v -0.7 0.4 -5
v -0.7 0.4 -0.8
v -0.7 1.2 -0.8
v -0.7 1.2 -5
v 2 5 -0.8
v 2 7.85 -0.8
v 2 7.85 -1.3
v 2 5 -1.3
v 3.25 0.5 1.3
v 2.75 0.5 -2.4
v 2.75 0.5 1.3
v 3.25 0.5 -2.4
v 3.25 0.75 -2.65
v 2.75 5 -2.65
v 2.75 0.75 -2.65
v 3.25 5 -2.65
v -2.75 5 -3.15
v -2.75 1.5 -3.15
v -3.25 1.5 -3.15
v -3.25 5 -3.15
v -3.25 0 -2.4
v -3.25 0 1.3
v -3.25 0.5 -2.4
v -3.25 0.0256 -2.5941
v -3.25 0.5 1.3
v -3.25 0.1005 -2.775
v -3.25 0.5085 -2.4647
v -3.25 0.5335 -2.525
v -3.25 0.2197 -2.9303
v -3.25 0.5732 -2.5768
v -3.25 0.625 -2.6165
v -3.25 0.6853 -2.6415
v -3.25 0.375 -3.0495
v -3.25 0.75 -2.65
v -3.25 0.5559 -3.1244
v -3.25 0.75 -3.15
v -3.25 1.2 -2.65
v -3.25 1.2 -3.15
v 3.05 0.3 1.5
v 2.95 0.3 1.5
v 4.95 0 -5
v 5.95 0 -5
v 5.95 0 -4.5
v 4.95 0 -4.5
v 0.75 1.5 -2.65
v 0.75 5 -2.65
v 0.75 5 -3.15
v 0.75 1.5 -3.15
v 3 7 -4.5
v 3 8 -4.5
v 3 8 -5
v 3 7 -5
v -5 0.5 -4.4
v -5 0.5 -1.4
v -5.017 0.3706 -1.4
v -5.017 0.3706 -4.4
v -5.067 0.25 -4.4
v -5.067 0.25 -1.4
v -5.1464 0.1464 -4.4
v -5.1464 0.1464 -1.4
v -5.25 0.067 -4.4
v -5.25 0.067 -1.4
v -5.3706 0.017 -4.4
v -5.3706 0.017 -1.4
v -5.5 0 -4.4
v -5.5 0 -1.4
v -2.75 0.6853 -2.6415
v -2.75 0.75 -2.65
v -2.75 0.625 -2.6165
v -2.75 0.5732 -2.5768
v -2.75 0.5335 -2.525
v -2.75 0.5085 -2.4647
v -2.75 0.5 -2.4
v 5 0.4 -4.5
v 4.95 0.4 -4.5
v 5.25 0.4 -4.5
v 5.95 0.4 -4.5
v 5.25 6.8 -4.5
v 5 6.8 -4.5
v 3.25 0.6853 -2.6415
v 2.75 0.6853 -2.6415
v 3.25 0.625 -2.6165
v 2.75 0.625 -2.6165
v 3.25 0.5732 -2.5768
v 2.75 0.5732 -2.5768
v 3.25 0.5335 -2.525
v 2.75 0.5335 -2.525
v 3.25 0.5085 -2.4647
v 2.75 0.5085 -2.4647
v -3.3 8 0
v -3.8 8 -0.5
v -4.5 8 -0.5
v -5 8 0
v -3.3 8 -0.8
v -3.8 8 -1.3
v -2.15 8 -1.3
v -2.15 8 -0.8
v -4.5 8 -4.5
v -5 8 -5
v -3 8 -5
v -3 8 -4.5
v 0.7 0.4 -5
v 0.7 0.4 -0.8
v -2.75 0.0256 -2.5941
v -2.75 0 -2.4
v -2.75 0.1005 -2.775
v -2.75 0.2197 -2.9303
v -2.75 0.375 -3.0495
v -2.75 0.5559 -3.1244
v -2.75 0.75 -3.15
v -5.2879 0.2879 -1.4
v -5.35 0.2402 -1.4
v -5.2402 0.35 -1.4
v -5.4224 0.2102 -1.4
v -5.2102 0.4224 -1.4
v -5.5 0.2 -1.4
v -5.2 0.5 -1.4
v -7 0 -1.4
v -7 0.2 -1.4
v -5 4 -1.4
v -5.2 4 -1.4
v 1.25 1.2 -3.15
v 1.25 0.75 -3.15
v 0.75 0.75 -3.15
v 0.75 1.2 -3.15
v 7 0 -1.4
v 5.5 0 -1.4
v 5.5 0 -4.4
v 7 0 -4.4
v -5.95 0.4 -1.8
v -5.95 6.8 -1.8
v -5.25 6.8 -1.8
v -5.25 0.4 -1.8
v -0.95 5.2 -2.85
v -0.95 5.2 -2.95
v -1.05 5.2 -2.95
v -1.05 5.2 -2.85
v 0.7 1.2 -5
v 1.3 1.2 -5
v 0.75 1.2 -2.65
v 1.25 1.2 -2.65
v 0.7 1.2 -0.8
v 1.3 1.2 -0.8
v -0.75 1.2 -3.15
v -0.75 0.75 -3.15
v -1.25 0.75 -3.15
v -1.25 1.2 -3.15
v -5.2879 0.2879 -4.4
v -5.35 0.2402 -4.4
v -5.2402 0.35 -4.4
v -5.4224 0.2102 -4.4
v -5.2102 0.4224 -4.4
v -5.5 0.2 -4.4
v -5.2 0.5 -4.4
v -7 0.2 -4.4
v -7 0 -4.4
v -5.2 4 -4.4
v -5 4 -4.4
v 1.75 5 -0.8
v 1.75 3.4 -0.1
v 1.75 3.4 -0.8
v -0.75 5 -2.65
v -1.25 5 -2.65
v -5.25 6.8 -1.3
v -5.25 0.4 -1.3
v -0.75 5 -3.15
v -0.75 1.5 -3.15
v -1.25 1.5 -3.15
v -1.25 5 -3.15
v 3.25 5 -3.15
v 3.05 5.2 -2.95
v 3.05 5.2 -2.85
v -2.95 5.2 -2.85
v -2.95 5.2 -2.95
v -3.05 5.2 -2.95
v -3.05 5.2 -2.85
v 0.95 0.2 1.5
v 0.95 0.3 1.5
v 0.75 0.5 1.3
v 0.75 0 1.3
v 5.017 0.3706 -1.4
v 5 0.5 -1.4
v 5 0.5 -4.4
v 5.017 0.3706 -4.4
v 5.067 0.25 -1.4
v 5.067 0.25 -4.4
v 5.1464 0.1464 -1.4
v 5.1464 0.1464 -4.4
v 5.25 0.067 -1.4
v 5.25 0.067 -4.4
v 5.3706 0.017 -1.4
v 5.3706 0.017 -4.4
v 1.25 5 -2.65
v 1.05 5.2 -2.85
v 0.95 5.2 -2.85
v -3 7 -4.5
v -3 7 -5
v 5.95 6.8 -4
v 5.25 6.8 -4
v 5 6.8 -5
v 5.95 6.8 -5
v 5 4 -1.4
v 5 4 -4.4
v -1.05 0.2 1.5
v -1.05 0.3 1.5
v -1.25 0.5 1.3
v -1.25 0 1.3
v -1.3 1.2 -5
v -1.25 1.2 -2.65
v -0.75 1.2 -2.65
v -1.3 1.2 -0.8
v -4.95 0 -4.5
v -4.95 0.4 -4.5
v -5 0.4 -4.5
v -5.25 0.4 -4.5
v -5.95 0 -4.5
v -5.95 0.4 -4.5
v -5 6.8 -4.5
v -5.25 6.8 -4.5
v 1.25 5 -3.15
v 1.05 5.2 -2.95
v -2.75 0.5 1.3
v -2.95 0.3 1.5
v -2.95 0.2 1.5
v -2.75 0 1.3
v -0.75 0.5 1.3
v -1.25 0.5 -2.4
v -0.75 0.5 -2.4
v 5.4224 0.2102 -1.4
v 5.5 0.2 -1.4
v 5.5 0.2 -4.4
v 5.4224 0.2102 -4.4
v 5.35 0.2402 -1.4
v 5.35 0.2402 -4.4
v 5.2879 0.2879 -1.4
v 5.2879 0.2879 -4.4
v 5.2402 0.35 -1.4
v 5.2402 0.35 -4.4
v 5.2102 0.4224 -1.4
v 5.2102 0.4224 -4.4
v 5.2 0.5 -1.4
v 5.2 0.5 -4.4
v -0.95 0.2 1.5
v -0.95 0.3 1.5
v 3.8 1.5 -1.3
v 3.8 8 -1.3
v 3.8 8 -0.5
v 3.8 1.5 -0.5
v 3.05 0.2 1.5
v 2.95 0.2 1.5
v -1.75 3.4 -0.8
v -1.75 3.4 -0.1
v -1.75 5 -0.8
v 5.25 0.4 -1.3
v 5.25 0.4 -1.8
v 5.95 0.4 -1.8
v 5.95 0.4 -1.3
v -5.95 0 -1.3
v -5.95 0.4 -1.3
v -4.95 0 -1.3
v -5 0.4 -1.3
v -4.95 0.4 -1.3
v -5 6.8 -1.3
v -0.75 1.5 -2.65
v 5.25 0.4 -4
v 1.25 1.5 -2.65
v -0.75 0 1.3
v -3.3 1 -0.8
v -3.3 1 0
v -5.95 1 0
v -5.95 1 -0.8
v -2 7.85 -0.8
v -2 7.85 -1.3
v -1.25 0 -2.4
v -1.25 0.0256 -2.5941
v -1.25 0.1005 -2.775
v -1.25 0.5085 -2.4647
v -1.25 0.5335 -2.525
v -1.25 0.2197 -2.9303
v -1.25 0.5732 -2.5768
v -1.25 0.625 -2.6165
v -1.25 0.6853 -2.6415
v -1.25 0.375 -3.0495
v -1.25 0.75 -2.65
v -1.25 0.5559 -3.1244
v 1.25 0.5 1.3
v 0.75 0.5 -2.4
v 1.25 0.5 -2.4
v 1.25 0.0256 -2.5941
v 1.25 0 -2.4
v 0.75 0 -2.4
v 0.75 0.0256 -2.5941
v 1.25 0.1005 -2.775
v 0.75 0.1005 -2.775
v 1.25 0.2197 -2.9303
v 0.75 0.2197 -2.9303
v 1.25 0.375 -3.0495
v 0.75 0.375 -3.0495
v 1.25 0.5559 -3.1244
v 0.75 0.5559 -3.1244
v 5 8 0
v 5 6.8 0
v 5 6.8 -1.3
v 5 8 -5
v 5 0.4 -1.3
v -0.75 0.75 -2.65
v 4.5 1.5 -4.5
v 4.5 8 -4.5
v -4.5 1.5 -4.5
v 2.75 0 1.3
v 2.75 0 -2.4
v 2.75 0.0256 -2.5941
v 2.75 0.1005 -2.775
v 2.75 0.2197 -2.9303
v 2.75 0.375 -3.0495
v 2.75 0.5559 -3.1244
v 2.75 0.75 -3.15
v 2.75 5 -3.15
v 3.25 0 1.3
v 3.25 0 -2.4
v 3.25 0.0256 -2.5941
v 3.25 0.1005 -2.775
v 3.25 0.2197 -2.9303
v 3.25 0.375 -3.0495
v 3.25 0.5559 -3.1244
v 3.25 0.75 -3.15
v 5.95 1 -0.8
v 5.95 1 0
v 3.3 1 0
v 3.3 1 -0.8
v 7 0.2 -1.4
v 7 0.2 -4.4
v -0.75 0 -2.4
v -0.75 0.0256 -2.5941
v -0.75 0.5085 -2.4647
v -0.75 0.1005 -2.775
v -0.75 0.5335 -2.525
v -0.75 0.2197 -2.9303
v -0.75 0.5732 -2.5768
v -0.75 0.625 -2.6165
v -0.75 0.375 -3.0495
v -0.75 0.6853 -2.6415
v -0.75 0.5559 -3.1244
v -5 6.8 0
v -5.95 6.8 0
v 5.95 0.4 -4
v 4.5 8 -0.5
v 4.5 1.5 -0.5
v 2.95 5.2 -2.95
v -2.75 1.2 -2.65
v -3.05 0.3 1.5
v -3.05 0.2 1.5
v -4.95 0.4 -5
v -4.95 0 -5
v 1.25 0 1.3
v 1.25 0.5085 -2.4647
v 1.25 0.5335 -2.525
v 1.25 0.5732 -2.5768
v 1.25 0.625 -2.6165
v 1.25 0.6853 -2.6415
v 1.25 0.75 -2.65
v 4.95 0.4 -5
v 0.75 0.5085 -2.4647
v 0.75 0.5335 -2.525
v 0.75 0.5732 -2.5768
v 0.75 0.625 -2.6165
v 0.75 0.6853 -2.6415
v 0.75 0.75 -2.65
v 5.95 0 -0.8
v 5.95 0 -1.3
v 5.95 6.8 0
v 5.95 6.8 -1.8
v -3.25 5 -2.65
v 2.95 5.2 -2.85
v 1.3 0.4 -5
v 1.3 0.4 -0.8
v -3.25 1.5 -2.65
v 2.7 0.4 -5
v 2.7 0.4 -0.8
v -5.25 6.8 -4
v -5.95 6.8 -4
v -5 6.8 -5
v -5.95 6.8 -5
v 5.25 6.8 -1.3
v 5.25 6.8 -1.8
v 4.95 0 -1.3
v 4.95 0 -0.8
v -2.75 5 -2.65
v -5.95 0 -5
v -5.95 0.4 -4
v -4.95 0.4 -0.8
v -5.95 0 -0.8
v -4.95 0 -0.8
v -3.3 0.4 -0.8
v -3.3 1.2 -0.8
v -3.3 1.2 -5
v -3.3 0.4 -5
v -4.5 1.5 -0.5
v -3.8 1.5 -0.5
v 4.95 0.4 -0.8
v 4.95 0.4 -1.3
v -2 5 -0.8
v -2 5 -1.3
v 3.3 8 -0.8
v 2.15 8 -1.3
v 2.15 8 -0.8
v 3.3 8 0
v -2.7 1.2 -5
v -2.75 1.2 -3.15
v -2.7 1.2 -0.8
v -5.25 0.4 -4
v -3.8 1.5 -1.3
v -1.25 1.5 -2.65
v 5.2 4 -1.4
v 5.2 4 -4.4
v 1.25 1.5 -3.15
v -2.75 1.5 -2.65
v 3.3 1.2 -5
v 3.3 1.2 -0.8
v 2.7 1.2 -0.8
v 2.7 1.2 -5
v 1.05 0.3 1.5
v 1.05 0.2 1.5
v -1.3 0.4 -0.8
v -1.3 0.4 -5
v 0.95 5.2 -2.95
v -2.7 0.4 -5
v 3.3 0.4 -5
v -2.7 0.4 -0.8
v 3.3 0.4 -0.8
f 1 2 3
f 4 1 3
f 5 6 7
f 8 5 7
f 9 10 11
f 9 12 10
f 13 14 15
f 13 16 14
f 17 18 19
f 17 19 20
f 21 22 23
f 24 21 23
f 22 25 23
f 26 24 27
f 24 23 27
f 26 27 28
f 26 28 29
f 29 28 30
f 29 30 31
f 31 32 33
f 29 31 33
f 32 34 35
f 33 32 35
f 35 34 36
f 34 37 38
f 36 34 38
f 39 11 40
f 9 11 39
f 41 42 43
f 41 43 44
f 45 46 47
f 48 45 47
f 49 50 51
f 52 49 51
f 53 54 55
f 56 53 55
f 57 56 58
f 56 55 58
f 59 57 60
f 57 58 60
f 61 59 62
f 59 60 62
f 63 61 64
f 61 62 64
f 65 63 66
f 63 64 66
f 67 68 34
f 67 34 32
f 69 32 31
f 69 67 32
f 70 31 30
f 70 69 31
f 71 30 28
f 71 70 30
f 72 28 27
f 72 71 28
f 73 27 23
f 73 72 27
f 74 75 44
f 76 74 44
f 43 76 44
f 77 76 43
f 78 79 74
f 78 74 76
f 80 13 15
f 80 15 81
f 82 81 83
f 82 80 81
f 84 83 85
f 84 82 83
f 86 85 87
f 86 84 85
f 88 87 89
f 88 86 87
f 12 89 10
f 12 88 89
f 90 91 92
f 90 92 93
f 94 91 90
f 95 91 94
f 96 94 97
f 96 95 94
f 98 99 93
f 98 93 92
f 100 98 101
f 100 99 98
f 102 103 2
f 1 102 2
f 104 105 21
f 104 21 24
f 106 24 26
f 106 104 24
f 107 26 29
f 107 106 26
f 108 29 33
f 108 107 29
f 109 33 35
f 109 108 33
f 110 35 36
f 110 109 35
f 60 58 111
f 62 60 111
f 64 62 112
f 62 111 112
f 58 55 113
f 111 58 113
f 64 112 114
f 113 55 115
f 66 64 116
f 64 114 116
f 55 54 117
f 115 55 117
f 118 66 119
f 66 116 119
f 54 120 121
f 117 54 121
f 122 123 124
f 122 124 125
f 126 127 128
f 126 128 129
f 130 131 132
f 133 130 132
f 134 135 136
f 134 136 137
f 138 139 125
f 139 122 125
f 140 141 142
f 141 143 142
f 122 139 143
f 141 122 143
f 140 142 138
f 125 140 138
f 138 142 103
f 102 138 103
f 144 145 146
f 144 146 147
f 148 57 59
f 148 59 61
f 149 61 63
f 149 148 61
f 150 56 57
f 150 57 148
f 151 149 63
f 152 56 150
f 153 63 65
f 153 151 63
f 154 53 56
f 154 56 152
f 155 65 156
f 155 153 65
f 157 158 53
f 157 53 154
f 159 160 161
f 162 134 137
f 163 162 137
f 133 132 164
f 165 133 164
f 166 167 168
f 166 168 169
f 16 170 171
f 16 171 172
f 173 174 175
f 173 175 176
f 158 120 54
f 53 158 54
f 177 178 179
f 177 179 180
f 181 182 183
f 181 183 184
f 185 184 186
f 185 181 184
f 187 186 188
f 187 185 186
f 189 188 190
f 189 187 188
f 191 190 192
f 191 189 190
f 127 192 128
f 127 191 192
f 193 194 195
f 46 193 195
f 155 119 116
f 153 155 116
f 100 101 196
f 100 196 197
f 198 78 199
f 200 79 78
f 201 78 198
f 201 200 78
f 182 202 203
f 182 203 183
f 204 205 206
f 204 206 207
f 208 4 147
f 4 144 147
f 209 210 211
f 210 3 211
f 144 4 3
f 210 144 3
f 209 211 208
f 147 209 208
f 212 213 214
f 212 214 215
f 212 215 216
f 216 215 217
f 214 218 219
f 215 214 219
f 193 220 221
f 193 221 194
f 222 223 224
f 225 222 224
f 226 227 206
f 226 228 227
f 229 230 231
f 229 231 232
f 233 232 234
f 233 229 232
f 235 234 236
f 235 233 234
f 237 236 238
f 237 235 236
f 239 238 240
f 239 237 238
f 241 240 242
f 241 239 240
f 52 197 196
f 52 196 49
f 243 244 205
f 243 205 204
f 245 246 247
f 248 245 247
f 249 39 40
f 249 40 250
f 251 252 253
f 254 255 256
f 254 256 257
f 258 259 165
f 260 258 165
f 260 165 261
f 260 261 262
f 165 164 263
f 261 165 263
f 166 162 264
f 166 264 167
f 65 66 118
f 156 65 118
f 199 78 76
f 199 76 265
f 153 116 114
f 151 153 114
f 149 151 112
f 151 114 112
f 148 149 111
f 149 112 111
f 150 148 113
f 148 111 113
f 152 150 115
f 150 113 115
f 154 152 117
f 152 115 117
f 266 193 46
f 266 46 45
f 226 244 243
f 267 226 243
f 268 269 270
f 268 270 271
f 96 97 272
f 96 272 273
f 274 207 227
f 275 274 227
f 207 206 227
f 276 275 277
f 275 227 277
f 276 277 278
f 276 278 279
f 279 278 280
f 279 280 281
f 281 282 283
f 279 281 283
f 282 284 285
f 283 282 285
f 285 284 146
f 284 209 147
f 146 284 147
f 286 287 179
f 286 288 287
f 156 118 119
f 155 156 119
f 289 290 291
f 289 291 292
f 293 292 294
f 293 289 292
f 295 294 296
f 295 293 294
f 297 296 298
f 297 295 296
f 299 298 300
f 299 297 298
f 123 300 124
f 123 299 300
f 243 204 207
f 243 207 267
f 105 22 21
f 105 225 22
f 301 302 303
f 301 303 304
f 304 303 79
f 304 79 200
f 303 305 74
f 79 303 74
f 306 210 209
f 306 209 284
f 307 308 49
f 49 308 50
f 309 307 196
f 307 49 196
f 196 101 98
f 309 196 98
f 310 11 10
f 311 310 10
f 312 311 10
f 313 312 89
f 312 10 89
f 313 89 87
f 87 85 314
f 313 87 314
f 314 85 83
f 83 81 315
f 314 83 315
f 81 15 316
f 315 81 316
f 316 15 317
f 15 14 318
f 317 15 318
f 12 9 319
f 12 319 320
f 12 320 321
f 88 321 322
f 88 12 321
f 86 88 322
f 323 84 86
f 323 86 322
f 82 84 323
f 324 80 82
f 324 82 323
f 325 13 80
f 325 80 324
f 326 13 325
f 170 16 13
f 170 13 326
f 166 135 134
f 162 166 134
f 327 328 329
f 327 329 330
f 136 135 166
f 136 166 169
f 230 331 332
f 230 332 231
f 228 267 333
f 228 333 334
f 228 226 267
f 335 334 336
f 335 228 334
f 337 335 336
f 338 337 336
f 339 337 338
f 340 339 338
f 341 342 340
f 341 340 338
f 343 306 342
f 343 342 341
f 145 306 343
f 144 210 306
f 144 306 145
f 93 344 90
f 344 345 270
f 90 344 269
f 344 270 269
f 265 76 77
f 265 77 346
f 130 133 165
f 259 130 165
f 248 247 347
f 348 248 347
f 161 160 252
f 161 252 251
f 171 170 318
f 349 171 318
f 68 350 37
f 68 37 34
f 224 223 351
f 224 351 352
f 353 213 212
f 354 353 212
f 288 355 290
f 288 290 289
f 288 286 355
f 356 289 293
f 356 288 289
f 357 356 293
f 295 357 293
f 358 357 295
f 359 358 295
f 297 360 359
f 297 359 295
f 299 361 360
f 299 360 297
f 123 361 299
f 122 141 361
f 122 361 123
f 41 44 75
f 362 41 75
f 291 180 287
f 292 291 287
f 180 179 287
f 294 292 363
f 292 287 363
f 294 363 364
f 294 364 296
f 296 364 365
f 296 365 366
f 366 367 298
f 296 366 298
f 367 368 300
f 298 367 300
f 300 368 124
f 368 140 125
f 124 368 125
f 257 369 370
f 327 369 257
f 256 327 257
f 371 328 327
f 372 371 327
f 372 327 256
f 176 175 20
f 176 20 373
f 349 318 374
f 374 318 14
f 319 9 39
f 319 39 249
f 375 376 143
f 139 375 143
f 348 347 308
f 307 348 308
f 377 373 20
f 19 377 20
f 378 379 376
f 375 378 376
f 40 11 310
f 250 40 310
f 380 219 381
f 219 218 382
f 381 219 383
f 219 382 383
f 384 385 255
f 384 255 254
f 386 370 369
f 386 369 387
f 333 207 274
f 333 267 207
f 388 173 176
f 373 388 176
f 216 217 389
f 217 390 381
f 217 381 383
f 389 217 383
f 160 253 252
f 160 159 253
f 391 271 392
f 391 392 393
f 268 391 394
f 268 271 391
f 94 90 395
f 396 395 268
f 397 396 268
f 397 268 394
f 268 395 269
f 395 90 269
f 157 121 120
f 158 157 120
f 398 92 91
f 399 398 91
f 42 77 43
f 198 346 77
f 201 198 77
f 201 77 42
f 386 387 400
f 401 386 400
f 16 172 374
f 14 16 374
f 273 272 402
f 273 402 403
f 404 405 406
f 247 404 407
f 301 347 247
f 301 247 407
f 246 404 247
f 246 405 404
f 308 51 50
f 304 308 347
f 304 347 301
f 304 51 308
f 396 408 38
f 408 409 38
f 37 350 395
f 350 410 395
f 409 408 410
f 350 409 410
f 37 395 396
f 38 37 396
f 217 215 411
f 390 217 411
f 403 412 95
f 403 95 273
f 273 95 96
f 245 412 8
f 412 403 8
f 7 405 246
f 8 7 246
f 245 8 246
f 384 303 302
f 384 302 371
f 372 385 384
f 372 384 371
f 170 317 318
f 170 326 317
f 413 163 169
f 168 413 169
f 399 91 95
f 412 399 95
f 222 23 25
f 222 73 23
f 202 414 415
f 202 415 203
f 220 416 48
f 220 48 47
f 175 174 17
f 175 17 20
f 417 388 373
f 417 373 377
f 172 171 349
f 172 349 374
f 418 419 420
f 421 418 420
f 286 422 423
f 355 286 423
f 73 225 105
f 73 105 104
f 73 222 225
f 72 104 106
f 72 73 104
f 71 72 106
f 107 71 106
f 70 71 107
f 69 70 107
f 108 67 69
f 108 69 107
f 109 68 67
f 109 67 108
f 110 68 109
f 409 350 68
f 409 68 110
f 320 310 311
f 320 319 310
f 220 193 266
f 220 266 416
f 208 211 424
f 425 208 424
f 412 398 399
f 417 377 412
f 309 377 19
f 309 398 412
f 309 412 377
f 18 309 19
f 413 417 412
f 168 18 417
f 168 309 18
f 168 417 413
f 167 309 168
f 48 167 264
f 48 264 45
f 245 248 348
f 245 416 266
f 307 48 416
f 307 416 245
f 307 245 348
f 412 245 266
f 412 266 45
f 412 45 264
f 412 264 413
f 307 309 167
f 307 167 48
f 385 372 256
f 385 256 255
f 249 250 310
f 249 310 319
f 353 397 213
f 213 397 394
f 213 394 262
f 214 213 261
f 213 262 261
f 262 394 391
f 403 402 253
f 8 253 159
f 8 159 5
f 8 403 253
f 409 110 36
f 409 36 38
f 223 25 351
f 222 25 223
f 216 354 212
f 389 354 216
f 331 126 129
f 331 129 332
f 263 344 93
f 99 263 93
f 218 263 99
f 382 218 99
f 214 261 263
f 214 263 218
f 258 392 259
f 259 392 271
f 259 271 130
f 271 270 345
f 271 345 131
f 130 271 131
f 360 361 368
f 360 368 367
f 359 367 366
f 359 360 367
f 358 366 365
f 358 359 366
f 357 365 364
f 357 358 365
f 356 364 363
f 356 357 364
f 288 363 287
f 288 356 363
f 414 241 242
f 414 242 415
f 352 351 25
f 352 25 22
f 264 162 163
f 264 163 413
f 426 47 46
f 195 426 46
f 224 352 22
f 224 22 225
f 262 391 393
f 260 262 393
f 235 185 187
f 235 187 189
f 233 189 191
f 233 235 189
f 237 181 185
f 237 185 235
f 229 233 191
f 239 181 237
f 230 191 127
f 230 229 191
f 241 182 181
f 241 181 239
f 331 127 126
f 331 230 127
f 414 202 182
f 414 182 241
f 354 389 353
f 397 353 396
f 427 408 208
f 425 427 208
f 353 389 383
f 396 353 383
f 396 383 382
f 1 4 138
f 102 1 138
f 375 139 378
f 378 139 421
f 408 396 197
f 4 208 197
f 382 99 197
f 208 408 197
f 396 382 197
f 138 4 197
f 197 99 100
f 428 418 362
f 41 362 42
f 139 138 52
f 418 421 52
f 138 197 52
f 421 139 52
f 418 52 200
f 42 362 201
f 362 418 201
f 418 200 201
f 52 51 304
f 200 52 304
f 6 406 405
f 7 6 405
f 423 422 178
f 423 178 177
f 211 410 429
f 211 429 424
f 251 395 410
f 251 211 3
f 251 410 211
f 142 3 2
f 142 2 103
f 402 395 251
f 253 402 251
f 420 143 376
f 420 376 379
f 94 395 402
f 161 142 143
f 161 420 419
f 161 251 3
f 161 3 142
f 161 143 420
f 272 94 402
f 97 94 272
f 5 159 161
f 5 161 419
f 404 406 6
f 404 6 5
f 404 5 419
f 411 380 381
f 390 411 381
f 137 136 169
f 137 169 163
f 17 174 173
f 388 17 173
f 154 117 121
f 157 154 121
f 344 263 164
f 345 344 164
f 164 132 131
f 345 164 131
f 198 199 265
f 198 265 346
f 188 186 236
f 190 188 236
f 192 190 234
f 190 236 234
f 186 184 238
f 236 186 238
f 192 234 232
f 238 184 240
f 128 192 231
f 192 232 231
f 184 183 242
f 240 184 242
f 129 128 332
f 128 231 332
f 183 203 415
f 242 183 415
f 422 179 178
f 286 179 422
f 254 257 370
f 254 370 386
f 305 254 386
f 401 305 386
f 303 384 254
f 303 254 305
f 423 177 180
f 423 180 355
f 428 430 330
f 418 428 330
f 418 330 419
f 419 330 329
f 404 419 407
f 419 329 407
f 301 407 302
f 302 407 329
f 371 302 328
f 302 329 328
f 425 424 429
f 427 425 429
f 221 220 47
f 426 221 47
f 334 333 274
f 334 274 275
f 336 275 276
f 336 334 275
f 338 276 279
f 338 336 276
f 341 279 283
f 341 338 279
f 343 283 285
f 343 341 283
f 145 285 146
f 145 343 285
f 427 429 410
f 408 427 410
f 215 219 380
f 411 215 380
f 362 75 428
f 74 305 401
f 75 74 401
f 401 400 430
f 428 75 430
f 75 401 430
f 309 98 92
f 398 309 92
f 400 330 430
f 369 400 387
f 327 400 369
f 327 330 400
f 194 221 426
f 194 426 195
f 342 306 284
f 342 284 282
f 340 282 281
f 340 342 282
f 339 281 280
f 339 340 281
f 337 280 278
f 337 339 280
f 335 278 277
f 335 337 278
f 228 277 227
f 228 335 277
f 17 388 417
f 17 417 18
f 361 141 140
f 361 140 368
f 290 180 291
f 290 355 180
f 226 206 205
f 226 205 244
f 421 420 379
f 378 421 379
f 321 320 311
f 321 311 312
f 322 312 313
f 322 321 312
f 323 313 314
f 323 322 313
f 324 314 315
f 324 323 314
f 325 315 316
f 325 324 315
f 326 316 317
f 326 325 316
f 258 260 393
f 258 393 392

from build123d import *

# Parameters (mm, degrees)
ESQUISSE1_W                             = 10
ESQUISSE1_H                             = 5
BOSS_EXTRU_1_DEPTH                      = 8
ESQUISSE2_W                             = 6.6
ESQUISSE2_H                             = 1.6
ENL_V_MAT_EXTRU_1_DEPTH                 = 9
ENL_V_MAT_EXTRU_2_DEPTH                 = 6.5
BOSS_EXTRU_3_START                      = -1.2
BOSS_EXTRU_3_DEPTH                      = 6.8
ESQUISSE5_W                             = 6
ESQUISSE5_H                             = 1
ENL_V_MAT_EXTRU_3_DEPTH                 = 1
ESQUISSE6_W                             = 4
ESQUISSE6_H                             = 1
ENL_V_MAT_EXTRU_4_DEPTH                 = 3
ESQUISSE7_W                             = 0.8
ESQUISSE7_H                             = 1
ENL_V_MAT_EXTRU_5_DEPTH                 = 12.9
BOSS_EXTRU_2_DEPTH                      = 1.75
ENL_V_MAT_EXTRU_6_DEPTH                 = 5.2
ESQUISSE20_W                            = 3.2
ESQUISSE20_H                            = 0.4
ENL_V_MAT_EXTRU_7_DEPTH                 = 12.2
ENL_V_MAT_EXTRU_7_DEPTH_BACK            = 1.7
CHANFREIN1_SIZE                         = 0.15
EXTRU_MINCE1_DEPTH                      = 0.25
CHANFREIN2_SIZE                         = 0.2
R_P_TITION_LIN_AIRE1_COUNT              = 4
R_P_TITION_LIN_AIRE1_PITCH              = 2
CHANFREIN2_OF_R_P_TITION_LIN_AIRE1_SIZE = 0.2
EXTRU_MINCE2_START                      = 0.1
EXTRU_MINCE2_DEPTH                      = 3


with BuildPart() as part:
    # Esquisse1 → Boss.-Extru.1 (new body)
    with BuildSketch(Plane(origin=(0, 0, 0), x_dir=(1, 0, 0), z_dir=(0, 1, 0))):
        with Locations((0, 2.5)):
            Rectangle(ESQUISSE1_W, ESQUISSE1_H)
    extrude(amount=BOSS_EXTRU_1_DEPTH)

    # Esquisse2 → Enlèv. mat.-Extru.1 (cut, through all)
    with BuildSketch(Plane(origin=(0, 8, 0), x_dir=(1, 0, 0), z_dir=(0, 1, 0))):
        Rectangle(ESQUISSE2_W, ESQUISSE2_H)
    extrude(amount=-ENL_V_MAT_EXTRU_1_DEPTH, mode=Mode.SUBTRACT)

    # Esquisse4 → Enlèv. mat.-Extru.2 (cut)
    with BuildSketch(Plane(origin=(0, 8, 0), x_dir=(1, 0, 0), z_dir=(0, 1, 0))):
        Polygon((-3.8, 1.3), (3.8, 1.3), (3.8, 0.5), (4.5, 0.5), (4.5, 4.5), (-4.5, 4.5), (-4.5, 0.5), (-3.8, 0.5), align=None)
    extrude(amount=-ENL_V_MAT_EXTRU_2_DEPTH, mode=Mode.SUBTRACT)

    # Esquisse17 → Boss.-Extru.3 (add)
    with BuildSketch(Plane(origin=(0, 8, 0), x_dir=(1, 0, 0), z_dir=(0, 1, 0)).offset(BOSS_EXTRU_3_START)):
        Polygon((5.95, 5), (5, 5), (5, 4.5), (5.25, 4.5), (5.25, 4), (5.95, 4), align=None)
        Polygon((5.25, 1.3), (5, 1.3), (5, 0), (5.95, 0), (5.95, 1.8), (5.25, 1.8), align=None)
    boss_extru_3 = extrude(amount=-BOSS_EXTRU_3_DEPTH)

    # Symétrie3: Boss.-Extru.3 across plane
    add(boss_extru_3.mirror(Plane(origin=(0, 0, 0), x_dir=(0, 0, 1), z_dir=(1, 0, 0))))

    # Esquisse5 → Enlèv. mat.-Extru.3 (cut)
    with BuildSketch(Plane(origin=(0, 8, 0), x_dir=(1, 0, 0), z_dir=(0, 1, 0))):
        with Locations((0, 4.5)):
            Rectangle(ESQUISSE5_W, ESQUISSE5_H)
    extrude(amount=-ENL_V_MAT_EXTRU_3_DEPTH, mode=Mode.SUBTRACT)

    # Esquisse6 → Enlèv. mat.-Extru.4 (cut)
    with BuildSketch(Plane(origin=(0, 8, 0), x_dir=(1, 0, 0), z_dir=(0, 1, 0))):
        with Locations((0, 0.8)):
            Rectangle(ESQUISSE6_W, ESQUISSE6_H)
    extrude(amount=-ENL_V_MAT_EXTRU_4_DEPTH, mode=Mode.SUBTRACT)

    # Esquisse7 → Enlèv. mat.-Extru.5 (cut, through all)
    with BuildSketch(Plane(origin=(5.95, 0, 0), x_dir=(0, 0, -1), z_dir=(1, 0, 0))):
        with Locations((0.4, 0.5)):
            Rectangle(ESQUISSE7_W, ESQUISSE7_H)
    extrude(amount=-ENL_V_MAT_EXTRU_5_DEPTH, mode=Mode.SUBTRACT)

    # Esquisse11 → Boss.-Extru.2 (add, symmetric)
    with BuildSketch(Plane(origin=(0, 0, 0), x_dir=(0, 0, -1), z_dir=(1, 0, 0))):
        Polygon((0.8, 5), (0.1, 3.4), (0.8, 3.4), align=None)
    extrude(amount=BOSS_EXTRU_2_DEPTH, both=True)

    # Esquisse18 → Enlèv. mat.-Extru.6 (cut, through all)
    with BuildSketch(Plane.XY.offset(-0.8)):
        Polygon((-4.95, 0.4), (-4.95, -0.4), (4.95, -0.4), (4.95, 0.4), (3.3, 0.4), (3.3, 1.2), (2.7, 1.2), (2.7, 0.4), (1.3, 0.4), (1.3, 1.2), (0.7, 1.2), (0.7, 0.4), (-0.7, 0.4), (-0.7, 1.2), (-1.3, 1.2), (-1.3, 0.4), (-2.7, 0.4), (-2.7, 1.2), (-3.3, 1.2), (-3.3, 0.4), align=None)
    extrude(amount=-ENL_V_MAT_EXTRU_6_DEPTH, mode=Mode.SUBTRACT)

    # Esquisse20 → Enlèv. mat.-Extru.7 (cut, two sides)
    with BuildSketch(Plane.ZY.offset(-5.25)) as enl_v_mat_extru_7_sk:
        with Locations((-2.9, 0.2)):
            Rectangle(ESQUISSE20_W, ESQUISSE20_H)
    extrude(amount=ENL_V_MAT_EXTRU_7_DEPTH, mode=Mode.SUBTRACT)
    extrude(enl_v_mat_extru_7_sk.sketch, amount=-ENL_V_MAT_EXTRU_7_DEPTH_BACK, mode=Mode.SUBTRACT)

    # Chanfrein1
    chanfrein1_edges = [part.edges().sort_by_distance(p)[0] for p in [
        (2, 8, -1.05),
        (-2, 8, -1.05),
    ]]
    chamfer(chanfrein1_edges, length=CHANFREIN1_SIZE)


with BuildPart() as body_2:
    # Esquisse21 → Extru.-Mince1 (new body, symmetric)
    with BuildSketch(Plane(origin=(3, 0, 0), x_dir=(0, 0, -1), z_dir=(1, 0, 0))):
        with BuildLine():
            Line((2.65, 5.2), (2.65, 0.75))
            ThreePointArc((2.65, 0.75), (2.576776695, 0.573223305), (2.4, 0.5))
            Line((2.4, 0.5), (-1.5, 0.5))
            Line((-1.5, 0.5), (-1.5, 0))
            Line((-1.5, 0), (2.4, 0))
            ThreePointArc((2.4, 0), (2.930330086, 0.219669914), (3.15, 0.75))
            Line((3.15, 0.75), (3.15, 5.2))
            Line((3.15, 5.2), (2.65, 5.2))
        make_face()
    extru_mince1 = extrude(amount=EXTRU_MINCE1_DEPTH, both=True)

    # Chanfrein2
    chanfrein2_edges = [body_2.edges().sort_by_distance(p)[0] for p in [
        (3, 5.2, -2.65),
        (3, 5.2, -3.15),
        (3, 0, 1.5),
        (3, 0.5, 1.5),
        (3.25, 5.2, -2.9),
        (3.25, 0.25, 1.5),
        (2.75, 5.2, -2.9),
        (2.75, 0.25, 1.5),
    ]]
    chamfer(chanfrein2_edges, length=CHANFREIN2_SIZE)


with BuildPart() as part_1:
    add(part.part)

    # Répétition linéaire1: Extru.-Mince1 ×4
    with Locations(*[(-i * R_P_TITION_LIN_AIRE1_PITCH, 0, 0) for i in range(1, R_P_TITION_LIN_AIRE1_COUNT)]):
        add(extru_mince1)

    # Chanfrein2 of Répétition linéaire1
    chanfrein2_of_r_p_tition_lin_aire1_edges = [part_1.edges().sort_by_distance(p)[0] for p in [
        (1, 5.2, -2.65),
        (1, 5.2, -3.15),
        (1, 0, 1.5),
        (1, 0.5, 1.5),
        (1.25, 5.2, -2.9),
        (1.25, 0.25, 1.5),
        (0.75, 5.2, -2.9),
        (0.75, 0.25, 1.5),
        (-1, 5.2, -2.65),
        (-1, 5.2, -3.15),
        (-1, 0, 1.5),
        (-1, 0.5, 1.5),
        (-0.75, 5.2, -2.9),
        (-0.75, 0.25, 1.5),
        (-1.25, 5.2, -2.9),
        (-1.25, 0.25, 1.5),
        (-3, 5.2, -2.65),
        (-3, 5.2, -3.15),
        (-3, 0, 1.5),
        (-3, 0.5, 1.5),
        (-2.75, 5.2, -2.9),
        (-2.75, 0.25, 1.5),
        (-3.25, 5.2, -2.9),
        (-3.25, 0.25, 1.5),
    ]]
    chamfer(chanfrein2_of_r_p_tition_lin_aire1_edges, length=CHANFREIN2_OF_R_P_TITION_LIN_AIRE1_SIZE)


with BuildPart() as body_3:
    # Esquisse22 → Extru.-Mince2 (new body)
    with BuildSketch(Plane(origin=(0, 0, -1.3), x_dir=(-1, 0, 0), z_dir=(0, 0, -1)).offset(EXTRU_MINCE2_START)):
        with BuildLine():
            Line((-5, 4), (-5, 0.5))
            ThreePointArc((-5, 0.5), (-5.146446609, 0.146446609), (-5.5, 0))
            Line((-5.5, 0), (-7, 0))
            Line((-7, 0), (-7, 0.2))
            Line((-7, 0.2), (-5.5, 0.2))
            ThreePointArc((-5.5, 0.2), (-5.287867966, 0.287867966), (-5.2, 0.5))
            Line((-5.2, 0.5), (-5.2, 4))
            Line((-5.2, 4), (-5, 4))
        make_face()
    extrude(amount=EXTRU_MINCE2_DEPTH)


with BuildPart() as body_4:
    # Symétrie4: mirrored copy
    add(body_3.part.mirror(Plane(origin=(0, 0, 0), x_dir=(0, 0, 1), z_dir=(1, 0, 0))))


solid = Compound([body_2.part, part_1.part, body_3.part, body_4.part])
